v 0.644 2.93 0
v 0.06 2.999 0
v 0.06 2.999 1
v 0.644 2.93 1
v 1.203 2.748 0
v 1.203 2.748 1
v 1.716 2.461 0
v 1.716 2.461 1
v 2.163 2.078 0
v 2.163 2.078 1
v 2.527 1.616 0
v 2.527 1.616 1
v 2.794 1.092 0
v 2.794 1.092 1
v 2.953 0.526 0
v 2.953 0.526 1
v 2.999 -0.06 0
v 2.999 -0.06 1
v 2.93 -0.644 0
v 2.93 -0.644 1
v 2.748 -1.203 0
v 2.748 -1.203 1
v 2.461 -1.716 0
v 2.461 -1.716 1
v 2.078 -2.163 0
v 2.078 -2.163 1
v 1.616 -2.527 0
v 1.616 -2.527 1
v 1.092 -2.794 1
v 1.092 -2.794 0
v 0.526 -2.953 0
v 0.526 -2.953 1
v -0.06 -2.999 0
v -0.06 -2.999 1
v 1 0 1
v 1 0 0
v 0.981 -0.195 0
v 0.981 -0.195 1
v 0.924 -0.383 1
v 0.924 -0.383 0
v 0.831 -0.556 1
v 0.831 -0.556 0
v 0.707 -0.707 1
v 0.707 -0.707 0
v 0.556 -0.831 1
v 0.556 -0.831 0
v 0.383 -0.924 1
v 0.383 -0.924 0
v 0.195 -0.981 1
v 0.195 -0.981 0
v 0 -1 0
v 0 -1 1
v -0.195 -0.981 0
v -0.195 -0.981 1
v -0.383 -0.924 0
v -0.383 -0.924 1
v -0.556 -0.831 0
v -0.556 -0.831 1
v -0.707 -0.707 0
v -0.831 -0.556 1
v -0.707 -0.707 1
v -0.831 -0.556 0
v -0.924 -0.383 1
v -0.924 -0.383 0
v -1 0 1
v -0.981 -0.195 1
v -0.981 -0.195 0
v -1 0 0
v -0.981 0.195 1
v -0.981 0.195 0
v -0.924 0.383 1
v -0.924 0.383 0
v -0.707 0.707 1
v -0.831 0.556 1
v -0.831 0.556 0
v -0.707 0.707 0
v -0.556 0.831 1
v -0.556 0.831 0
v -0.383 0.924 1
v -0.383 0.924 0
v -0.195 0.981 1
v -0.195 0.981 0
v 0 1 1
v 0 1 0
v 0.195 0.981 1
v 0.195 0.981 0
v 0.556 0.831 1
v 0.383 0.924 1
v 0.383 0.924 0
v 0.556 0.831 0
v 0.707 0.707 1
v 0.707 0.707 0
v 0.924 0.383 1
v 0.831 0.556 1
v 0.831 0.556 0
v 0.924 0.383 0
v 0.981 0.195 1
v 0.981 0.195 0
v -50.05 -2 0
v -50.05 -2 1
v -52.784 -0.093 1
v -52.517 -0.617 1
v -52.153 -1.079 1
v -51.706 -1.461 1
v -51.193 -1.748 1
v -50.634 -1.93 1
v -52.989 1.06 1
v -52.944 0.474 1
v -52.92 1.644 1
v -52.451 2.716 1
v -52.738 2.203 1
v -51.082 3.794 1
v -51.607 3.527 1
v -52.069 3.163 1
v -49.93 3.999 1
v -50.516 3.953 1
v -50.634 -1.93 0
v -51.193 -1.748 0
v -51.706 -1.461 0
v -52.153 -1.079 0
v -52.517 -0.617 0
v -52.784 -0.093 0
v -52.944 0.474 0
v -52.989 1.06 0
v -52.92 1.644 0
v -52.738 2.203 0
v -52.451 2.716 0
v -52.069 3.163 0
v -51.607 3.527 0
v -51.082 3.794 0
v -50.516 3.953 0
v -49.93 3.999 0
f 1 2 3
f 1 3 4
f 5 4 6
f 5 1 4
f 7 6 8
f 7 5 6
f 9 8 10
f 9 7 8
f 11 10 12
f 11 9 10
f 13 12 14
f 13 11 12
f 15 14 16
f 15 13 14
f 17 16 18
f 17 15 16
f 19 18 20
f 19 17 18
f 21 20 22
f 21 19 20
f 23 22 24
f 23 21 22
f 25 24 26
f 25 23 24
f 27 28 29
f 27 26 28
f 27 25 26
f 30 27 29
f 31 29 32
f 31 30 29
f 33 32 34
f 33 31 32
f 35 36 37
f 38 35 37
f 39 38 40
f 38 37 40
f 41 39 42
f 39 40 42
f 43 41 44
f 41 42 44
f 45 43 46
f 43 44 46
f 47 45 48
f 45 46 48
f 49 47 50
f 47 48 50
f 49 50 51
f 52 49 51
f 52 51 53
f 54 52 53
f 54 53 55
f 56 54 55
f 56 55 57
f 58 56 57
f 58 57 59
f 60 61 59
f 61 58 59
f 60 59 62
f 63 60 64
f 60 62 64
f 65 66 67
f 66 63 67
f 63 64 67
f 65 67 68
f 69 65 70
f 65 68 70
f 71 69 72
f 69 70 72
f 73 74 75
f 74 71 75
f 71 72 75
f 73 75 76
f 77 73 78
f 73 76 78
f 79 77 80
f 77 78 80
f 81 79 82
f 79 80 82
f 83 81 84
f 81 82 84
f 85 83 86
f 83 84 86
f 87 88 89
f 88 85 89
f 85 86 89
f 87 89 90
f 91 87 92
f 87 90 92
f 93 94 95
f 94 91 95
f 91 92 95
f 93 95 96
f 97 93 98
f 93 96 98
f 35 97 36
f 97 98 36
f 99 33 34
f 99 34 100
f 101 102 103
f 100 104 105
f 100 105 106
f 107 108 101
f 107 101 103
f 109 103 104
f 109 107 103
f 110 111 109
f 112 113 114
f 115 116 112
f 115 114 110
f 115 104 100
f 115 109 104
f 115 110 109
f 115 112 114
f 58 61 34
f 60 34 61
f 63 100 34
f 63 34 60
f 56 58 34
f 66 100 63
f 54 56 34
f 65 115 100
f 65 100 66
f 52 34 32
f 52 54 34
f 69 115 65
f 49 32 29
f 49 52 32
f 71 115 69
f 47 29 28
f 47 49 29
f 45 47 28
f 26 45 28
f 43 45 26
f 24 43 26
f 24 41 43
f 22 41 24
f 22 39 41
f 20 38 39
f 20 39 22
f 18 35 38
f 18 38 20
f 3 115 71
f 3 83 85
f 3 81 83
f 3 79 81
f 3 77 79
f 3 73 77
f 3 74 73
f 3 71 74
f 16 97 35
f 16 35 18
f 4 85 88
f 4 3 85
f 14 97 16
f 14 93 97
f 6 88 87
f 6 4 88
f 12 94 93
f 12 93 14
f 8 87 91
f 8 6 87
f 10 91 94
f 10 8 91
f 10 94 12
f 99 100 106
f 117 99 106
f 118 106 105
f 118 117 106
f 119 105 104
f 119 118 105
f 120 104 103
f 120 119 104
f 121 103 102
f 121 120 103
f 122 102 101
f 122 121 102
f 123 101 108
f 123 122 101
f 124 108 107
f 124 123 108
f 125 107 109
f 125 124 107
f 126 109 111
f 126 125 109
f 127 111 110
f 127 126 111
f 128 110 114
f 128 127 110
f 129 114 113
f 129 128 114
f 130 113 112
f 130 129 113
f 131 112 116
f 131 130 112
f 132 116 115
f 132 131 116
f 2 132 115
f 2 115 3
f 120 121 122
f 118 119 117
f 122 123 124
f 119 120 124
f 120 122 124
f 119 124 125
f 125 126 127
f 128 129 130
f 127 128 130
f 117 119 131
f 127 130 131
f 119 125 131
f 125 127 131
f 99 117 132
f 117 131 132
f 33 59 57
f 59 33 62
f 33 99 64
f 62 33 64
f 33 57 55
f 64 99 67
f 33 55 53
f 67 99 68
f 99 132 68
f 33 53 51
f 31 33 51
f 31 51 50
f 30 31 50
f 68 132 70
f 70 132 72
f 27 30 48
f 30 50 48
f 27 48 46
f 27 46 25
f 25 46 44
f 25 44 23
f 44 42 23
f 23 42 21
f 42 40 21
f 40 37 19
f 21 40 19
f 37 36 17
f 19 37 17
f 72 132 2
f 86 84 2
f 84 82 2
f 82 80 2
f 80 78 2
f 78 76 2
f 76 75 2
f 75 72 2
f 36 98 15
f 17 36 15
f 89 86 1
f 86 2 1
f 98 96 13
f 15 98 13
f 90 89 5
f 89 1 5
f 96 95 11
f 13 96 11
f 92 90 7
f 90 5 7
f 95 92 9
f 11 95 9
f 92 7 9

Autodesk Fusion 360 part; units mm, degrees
sketch "Sketch1" plane through (0, 0, 0) normal (0, 0, 1) x (1, 0, 0)
  line L0 (-64.0556, -47.9598) -> (-64.1923, -47.777)
  line L1 (-64.0556, -47.9598) -> (-63.9189, -48.1426)
  arc A0 (-64.1923, -47.777) -> (-57.1589, -48.7607) centre (-60.188, -44.7827) ccw
  arc A1 (-62.8738, -41.1181) -> (-63.9189, -48.1426) centre (-59.9146, -45.1483) ccw
  line L2 (-49.93, 3.9993) -> (0.06, 2.9994)
  line L3 (-0.06, -2.9994) -> (-50.05, -1.9996)
  arc A2 (-49.93, 3.9993) -> (-50.05, -1.9996) centre (-49.99, 0.9998) ccw
  arc A3 (-0.06, -2.9994) -> (0.06, 2.9994) centre (0, 0) ccw
  circle A4 centre (0, 0) radius 1
  point P0 (-4, 4.6)
  dimension "d2" = 5
  dimension "d3" = 5
  dimension "d10" = 6
  dimension "d11" = 6
  dimension "d13" = 50
  dimension "d14" = 2
extrude "Extrude2" add sketch "Sketch1" along normal blind 1 contours L2 L3 A2 A3
